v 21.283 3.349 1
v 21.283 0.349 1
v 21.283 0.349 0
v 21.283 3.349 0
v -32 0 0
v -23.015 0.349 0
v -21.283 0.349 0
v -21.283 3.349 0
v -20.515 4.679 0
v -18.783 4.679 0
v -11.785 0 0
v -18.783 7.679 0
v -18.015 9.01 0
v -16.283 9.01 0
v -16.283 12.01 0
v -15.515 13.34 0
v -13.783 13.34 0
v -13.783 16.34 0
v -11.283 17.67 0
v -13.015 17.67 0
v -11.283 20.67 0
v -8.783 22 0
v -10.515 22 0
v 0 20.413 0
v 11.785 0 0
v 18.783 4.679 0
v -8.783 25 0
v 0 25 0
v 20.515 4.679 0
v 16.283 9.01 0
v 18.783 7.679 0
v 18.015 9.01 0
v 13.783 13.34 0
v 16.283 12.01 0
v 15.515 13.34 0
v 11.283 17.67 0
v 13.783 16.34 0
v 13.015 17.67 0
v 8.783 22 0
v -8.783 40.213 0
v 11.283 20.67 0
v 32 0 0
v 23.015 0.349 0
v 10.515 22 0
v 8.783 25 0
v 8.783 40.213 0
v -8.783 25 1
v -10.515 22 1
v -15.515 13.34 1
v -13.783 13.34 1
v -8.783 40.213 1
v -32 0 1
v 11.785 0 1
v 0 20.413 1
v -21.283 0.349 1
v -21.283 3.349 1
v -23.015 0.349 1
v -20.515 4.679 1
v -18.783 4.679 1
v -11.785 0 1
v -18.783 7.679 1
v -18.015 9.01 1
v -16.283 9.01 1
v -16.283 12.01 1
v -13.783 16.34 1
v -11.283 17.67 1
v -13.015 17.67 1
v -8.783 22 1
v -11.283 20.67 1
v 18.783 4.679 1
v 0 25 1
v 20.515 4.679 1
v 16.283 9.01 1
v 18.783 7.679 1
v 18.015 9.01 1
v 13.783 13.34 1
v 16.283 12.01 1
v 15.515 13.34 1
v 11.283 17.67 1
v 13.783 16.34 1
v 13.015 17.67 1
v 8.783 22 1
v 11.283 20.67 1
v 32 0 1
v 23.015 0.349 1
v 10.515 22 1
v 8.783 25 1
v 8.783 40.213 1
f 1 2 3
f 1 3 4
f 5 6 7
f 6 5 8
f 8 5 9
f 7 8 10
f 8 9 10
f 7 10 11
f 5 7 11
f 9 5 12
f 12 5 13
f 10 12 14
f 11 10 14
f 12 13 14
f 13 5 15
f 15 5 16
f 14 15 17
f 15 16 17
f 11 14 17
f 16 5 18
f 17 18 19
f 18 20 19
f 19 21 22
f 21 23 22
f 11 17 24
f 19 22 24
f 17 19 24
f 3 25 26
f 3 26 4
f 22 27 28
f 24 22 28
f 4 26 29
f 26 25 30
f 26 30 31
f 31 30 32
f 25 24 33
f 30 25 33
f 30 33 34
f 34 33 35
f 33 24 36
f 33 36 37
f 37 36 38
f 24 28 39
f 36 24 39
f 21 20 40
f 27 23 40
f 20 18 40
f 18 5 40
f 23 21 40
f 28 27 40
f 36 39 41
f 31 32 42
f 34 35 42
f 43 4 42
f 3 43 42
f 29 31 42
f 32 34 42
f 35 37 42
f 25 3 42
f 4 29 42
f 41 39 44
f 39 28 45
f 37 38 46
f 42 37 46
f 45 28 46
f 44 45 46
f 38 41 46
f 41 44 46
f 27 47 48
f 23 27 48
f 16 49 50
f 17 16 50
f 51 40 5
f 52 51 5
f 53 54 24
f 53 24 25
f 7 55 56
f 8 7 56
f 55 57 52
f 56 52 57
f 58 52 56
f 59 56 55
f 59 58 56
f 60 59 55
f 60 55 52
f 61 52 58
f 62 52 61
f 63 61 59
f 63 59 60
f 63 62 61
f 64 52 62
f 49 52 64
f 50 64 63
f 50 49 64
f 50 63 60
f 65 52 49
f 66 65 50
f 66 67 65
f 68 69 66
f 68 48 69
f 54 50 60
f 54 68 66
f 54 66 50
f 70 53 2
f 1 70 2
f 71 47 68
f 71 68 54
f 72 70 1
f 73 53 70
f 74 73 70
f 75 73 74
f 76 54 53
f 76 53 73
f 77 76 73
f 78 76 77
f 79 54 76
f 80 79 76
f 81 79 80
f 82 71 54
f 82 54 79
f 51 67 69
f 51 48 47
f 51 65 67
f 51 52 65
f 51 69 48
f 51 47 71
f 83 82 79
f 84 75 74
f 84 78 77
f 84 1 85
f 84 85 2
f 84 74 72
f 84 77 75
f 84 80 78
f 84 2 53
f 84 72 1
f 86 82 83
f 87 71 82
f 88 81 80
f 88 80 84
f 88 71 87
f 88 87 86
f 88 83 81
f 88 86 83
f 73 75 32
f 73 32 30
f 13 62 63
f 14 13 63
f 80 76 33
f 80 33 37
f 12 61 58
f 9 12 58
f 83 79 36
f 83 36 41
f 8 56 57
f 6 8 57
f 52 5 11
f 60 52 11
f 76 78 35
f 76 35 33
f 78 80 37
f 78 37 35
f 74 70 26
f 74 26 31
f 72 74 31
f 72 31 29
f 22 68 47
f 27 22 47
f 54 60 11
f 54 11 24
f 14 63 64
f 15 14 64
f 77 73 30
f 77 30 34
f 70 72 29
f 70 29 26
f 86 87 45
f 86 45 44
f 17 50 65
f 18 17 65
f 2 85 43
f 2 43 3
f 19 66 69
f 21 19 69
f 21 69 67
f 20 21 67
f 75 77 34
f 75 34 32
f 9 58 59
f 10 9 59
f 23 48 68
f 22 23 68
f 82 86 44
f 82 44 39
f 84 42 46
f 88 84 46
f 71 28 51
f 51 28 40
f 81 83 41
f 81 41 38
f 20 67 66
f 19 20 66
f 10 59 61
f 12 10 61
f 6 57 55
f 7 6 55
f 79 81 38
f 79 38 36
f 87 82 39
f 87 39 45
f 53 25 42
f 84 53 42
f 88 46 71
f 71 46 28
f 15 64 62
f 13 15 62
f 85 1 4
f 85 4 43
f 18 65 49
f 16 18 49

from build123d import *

# Parameters (mm, degrees)
EXTRUDE_1_DEPTH     = 1
CUT_EXTRUDE_1_DEPTH = 52.40107317
CUT_EXTRUDE_2_DEPTH = 10


with BuildPart() as part:
    # 草图1 → 凸台-拉伸1 (new body)
    with BuildSketch(Plane.XY):
        Polygon((-32, 0), (32, 0), (8.783121635, 40.212812921), (0, 25), (-8.783121635, 40.212812921), align=None)
    extrude(amount=EXTRUDE_1_DEPTH)

    # 草图2 → 切除-拉伸1 (cut, through all)
    with BuildSketch(Plane.XY.offset(1)):
        Polygon((-8.783121635, 25), (-10.515172443, 22), (-8.783121635, 22), align=None)
        Polygon((-11.283121635, 17.669872981), (-11.283121635, 20.669872981), (-13.015172443, 17.669872981), align=None)
        Polygon((-13.783121635, 13.339745962), (-13.783121635, 16.339745962), (-15.515172443, 13.339745962), align=None)
        Polygon((-16.283121635, 9.009618943), (-16.283121635, 12.009618943), (-18.015172443, 9.009618943), align=None)
        Polygon((-18.783121635, 4.679491924), (-18.783121635, 7.679491924), (-20.515172443, 4.679491924), align=None)
        Polygon((-21.283121635, 0.349364905), (-21.283121635, 3.349364905), (-23.015172443, 0.349364905), align=None)
        Polygon((23.015172443, 0.349364905), (21.283121635, 0.349364905), (21.283121635, 3.349364905), align=None)
        Polygon((20.515172443, 4.679491924), (18.783121635, 4.679491924), (18.783121635, 7.679491924), align=None)
        Polygon((18.015172443, 9.009618943), (16.283121635, 9.009618943), (16.283121635, 12.009618943), align=None)
        Polygon((15.515172443, 13.339745962), (13.783121635, 13.339745962), (13.783121635, 16.339745962), align=None)
        Polygon((13.015172443, 17.669872981), (11.283121635, 17.669872981), (11.283121635, 20.669872981), align=None)
        Polygon((10.515172443, 22), (8.783121635, 22), (8.783121635, 25), align=None)
    extrude(amount=-CUT_EXTRUDE_1_DEPTH, mode=Mode.SUBTRACT)

    # 草图3 → 切除-拉伸2 (cut)
    with BuildSketch(Plane.XY.offset(1)):
        Polygon((-11.785343035, 0), (0, 20.412812921), (11.785343035, 0), align=None)
    extrude(amount=-CUT_EXTRUDE_2_DEPTH, mode=Mode.SUBTRACT)


solid = part.part
